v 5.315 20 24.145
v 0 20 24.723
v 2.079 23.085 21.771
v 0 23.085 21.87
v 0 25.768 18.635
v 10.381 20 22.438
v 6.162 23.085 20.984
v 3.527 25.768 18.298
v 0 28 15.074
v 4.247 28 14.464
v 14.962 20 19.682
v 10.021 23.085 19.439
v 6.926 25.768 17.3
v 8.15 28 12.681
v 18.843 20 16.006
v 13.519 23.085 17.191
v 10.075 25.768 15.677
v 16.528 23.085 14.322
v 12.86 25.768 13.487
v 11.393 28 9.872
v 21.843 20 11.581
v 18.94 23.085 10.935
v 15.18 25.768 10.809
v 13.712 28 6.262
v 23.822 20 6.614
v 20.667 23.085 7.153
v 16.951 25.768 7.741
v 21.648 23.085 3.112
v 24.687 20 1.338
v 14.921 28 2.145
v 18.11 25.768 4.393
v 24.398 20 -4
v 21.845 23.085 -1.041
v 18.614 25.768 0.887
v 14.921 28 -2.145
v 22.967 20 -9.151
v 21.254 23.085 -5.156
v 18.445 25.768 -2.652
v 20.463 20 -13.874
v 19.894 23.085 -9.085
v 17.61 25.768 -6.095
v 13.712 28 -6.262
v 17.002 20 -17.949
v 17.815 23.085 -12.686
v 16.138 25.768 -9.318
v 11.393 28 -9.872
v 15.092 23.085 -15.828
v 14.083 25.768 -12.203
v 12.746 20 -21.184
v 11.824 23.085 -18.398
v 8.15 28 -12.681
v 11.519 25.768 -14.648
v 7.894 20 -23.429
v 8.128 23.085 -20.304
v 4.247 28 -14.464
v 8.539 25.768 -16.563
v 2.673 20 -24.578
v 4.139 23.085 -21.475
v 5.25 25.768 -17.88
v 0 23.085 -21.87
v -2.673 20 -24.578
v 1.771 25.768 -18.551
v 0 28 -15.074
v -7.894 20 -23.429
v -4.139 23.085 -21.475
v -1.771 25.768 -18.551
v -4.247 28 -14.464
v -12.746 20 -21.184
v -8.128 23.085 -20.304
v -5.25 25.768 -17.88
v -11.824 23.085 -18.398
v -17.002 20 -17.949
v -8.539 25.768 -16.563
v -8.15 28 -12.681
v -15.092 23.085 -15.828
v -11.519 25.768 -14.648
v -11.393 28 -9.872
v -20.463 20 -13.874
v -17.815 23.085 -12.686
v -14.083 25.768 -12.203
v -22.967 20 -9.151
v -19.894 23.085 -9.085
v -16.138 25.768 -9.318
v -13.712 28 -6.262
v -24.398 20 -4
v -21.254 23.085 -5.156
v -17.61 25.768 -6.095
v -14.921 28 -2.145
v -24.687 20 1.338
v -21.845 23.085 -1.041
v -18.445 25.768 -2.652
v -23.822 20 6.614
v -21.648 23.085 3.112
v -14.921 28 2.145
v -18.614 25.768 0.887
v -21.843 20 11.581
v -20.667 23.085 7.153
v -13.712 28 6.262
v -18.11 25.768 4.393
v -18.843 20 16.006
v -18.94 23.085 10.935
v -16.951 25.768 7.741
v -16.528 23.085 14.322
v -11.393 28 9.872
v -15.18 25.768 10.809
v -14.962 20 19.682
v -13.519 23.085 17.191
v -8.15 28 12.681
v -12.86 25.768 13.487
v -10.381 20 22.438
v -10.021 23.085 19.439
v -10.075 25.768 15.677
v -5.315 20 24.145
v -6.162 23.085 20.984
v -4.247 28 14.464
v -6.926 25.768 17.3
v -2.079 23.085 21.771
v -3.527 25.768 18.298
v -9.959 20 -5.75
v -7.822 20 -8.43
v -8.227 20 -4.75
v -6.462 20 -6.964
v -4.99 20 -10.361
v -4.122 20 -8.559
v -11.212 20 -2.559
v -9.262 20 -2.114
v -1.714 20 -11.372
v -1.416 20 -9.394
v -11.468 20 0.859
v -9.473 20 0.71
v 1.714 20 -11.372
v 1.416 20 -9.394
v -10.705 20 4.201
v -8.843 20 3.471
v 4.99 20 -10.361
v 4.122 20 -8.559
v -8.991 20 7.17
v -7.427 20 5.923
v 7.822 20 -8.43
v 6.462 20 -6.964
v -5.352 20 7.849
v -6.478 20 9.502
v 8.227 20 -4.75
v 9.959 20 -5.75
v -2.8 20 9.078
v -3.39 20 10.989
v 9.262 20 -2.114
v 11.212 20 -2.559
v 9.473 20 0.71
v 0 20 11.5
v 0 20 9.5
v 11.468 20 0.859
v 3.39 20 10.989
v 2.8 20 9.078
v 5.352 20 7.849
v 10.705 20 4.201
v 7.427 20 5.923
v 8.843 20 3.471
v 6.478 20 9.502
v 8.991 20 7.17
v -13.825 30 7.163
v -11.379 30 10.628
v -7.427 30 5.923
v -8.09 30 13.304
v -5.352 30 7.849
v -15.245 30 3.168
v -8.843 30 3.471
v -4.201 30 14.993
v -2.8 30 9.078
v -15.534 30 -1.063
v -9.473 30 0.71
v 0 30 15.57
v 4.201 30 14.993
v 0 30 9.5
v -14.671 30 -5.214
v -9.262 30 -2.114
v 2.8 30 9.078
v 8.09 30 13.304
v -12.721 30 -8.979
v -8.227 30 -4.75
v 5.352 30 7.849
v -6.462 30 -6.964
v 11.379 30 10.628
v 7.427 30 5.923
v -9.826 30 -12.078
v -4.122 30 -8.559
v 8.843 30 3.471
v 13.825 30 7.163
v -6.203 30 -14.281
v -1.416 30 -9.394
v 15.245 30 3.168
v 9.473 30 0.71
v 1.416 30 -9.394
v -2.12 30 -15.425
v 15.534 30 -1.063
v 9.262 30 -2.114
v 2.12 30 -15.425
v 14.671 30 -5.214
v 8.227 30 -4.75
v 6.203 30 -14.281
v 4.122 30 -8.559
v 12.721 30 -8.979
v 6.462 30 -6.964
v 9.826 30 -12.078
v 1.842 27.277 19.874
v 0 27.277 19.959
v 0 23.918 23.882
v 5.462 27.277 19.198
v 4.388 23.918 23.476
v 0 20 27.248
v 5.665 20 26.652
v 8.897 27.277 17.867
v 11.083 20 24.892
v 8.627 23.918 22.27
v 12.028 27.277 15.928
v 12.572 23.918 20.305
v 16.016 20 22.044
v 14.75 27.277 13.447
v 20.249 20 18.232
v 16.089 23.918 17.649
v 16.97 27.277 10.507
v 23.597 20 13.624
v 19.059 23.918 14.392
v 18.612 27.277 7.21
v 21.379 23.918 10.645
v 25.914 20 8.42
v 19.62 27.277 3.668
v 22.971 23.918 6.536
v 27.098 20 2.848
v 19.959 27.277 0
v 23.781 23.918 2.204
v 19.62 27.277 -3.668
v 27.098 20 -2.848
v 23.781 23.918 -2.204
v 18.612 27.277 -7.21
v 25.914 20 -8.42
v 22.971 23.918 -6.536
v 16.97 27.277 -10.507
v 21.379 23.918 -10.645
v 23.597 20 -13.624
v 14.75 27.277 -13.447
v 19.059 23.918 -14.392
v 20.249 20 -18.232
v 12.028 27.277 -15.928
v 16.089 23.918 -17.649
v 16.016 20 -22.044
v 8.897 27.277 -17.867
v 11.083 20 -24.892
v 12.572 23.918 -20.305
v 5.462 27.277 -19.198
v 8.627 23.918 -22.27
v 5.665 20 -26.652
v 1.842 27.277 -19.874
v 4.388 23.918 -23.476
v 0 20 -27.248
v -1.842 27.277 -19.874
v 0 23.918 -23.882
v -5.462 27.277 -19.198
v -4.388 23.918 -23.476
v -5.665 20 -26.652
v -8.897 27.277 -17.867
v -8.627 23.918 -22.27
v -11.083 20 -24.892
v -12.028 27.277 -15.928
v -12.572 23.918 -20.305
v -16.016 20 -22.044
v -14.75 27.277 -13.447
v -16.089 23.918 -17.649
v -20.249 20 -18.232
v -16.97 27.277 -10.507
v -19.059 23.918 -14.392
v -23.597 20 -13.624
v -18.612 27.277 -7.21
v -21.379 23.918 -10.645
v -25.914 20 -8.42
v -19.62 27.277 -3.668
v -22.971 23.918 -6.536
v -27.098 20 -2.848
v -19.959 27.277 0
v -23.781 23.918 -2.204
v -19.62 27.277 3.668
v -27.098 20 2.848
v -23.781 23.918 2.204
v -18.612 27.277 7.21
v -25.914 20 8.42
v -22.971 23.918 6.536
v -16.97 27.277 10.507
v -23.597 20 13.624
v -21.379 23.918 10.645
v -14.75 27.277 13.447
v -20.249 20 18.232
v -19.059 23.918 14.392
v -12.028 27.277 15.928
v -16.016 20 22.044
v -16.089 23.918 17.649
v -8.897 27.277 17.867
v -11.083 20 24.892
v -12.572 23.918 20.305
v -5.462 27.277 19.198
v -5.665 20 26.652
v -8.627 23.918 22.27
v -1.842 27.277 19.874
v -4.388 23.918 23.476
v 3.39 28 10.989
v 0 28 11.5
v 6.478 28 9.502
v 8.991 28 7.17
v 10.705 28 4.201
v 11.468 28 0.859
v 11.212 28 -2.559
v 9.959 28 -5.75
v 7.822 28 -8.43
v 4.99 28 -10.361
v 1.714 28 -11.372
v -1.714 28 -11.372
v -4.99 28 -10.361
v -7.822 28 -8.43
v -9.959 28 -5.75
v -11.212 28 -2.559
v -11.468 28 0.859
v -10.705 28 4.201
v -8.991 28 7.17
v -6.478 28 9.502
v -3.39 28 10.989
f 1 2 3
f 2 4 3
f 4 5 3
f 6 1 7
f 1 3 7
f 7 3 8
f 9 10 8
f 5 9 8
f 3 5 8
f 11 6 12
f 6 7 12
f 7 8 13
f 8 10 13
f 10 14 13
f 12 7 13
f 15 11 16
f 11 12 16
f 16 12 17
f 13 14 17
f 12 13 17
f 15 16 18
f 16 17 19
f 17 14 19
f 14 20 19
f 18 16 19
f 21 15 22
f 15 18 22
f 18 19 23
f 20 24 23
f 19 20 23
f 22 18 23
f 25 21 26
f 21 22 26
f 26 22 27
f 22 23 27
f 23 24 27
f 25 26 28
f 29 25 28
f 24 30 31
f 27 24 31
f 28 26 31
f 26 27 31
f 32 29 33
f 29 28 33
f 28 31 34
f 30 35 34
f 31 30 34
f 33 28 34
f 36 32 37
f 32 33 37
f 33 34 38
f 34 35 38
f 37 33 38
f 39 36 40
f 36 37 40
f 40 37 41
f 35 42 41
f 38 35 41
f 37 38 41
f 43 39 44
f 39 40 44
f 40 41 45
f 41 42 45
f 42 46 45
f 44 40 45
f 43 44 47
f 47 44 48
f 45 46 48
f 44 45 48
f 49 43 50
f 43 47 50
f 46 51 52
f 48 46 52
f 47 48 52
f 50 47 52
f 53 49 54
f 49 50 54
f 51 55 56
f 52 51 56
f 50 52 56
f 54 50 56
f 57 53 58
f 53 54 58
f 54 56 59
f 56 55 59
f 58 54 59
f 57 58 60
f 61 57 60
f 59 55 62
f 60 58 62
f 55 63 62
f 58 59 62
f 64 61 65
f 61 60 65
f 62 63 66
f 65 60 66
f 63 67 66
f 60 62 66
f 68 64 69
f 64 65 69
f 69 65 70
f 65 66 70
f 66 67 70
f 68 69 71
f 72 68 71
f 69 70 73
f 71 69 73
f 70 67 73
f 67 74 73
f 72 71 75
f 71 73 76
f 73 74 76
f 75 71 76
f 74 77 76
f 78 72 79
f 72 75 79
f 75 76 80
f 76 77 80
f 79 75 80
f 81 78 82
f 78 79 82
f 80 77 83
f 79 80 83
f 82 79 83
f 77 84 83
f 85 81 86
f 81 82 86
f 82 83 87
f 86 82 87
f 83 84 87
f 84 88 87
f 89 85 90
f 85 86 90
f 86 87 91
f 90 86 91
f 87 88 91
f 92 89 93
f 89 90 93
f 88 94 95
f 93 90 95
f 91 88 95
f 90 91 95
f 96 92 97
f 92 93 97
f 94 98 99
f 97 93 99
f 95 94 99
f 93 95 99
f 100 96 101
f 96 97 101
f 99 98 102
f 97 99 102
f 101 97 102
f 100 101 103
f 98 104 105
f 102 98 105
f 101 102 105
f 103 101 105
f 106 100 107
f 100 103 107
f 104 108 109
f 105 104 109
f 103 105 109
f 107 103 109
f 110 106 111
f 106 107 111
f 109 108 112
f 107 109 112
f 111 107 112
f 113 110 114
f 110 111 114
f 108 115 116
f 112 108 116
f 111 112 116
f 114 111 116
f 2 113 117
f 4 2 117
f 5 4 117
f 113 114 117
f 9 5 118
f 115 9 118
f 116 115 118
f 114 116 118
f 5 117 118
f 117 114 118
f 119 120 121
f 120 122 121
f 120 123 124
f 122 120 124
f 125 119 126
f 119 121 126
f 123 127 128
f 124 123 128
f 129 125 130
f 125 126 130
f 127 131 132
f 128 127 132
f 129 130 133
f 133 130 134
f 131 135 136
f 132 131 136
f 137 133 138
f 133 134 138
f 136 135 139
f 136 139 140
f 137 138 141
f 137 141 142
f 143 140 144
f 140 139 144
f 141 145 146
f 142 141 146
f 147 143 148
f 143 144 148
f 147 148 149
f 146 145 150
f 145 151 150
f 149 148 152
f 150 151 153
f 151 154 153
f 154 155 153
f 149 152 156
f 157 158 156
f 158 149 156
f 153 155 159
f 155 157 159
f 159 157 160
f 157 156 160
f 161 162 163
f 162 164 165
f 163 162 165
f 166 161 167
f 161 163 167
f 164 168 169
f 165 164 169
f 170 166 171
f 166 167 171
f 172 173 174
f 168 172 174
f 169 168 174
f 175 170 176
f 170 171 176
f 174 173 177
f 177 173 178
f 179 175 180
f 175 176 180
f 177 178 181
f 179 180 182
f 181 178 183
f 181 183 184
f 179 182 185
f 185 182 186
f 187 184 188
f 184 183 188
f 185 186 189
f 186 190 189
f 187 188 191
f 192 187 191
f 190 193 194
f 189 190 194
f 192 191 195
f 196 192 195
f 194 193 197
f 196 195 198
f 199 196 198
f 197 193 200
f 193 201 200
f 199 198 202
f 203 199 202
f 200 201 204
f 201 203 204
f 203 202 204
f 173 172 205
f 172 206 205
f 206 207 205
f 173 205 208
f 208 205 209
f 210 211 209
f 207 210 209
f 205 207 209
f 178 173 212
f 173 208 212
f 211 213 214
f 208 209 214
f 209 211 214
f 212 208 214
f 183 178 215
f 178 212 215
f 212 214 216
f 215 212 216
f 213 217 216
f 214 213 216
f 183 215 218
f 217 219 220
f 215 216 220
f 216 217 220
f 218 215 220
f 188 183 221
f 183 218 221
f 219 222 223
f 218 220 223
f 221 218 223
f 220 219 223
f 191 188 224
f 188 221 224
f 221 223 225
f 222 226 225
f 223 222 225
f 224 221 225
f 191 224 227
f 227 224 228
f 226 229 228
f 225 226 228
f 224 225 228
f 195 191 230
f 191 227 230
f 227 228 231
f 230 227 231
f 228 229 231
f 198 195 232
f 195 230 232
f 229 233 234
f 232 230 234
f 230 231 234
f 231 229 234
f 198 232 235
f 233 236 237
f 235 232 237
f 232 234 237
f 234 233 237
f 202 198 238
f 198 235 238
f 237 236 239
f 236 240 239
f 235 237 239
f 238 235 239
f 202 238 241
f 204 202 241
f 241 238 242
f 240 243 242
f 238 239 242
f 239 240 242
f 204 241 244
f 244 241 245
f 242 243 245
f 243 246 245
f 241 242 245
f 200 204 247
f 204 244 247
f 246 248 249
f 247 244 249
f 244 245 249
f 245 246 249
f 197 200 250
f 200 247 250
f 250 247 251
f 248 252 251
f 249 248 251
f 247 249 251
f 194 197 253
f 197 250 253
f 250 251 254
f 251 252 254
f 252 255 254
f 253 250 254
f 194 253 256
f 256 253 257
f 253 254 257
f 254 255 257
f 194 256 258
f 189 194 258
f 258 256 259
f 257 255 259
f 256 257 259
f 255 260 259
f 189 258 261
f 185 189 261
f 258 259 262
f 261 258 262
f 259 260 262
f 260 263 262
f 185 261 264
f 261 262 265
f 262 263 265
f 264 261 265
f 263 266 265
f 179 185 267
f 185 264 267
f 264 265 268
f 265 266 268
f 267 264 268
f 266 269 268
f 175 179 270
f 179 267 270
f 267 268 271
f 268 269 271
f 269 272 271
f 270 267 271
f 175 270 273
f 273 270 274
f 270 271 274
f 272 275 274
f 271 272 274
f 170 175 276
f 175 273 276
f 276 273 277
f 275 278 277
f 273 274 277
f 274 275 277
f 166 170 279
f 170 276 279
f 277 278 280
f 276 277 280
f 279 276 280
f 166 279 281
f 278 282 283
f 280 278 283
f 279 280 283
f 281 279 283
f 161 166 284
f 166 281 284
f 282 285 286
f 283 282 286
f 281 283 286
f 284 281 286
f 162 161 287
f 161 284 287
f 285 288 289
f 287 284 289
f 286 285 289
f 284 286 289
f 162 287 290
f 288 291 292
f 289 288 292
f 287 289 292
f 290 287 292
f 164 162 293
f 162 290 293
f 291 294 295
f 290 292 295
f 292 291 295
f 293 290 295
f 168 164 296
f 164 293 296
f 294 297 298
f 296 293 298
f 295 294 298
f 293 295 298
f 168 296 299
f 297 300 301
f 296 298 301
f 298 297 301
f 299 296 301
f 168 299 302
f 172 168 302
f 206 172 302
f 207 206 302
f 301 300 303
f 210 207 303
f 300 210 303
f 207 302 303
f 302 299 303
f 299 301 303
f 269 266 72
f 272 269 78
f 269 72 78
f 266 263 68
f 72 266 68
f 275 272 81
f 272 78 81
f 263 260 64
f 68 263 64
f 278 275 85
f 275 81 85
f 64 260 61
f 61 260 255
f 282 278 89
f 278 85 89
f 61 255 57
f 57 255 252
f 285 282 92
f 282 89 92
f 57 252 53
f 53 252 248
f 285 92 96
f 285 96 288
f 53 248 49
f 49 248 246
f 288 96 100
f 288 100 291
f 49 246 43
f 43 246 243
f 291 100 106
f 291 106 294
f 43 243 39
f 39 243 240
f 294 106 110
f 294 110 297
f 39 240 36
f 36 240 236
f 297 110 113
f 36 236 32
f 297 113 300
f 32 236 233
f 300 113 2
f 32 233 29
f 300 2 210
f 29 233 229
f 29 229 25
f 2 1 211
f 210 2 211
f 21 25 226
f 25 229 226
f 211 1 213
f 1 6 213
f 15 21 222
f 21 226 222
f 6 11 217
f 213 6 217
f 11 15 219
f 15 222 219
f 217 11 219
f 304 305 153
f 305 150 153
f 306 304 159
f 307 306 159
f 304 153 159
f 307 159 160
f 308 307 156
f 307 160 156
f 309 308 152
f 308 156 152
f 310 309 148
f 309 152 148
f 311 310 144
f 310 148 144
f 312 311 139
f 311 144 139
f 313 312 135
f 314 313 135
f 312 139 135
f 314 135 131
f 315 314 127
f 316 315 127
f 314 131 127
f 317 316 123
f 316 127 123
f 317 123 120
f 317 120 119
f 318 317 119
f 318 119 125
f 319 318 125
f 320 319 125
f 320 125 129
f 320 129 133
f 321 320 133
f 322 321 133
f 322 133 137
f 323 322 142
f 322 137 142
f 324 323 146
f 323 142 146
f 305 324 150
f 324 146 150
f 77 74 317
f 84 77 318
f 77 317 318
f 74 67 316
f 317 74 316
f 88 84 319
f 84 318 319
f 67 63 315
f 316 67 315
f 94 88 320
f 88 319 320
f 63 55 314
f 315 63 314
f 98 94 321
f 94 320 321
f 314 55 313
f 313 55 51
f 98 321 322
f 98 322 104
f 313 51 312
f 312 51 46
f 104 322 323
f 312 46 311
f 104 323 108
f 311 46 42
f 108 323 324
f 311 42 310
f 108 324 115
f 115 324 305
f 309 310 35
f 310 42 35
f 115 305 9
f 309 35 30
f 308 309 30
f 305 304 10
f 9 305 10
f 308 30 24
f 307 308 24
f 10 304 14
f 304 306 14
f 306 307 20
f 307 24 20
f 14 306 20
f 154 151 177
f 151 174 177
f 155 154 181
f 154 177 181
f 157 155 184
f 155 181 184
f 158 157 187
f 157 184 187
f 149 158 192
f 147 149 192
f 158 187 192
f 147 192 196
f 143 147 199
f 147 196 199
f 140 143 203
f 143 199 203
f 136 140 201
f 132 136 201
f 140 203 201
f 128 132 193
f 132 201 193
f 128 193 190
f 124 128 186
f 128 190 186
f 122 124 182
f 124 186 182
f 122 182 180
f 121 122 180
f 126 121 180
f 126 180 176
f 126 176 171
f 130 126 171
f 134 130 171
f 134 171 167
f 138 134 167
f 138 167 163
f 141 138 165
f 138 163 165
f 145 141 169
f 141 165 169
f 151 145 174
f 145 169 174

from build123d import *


with BuildPart() as part:
    # Sketch2 → Revolve1 (revolve)
    with BuildSketch(Plane(origin=(0, 0, 0), x_dir=(0, 0, -1), z_dir=(1, 0, 0))):
        with BuildLine():
            Line((-11.5, 28), (-11.5, 20))
            Line((-11.5, 20), (-9.5, 20))
            Line((-9.5, 20), (-9.5, 30))
            Line((-9.5, 30), (-10.547037499, 30))
            ThreePointArc((-10.547037499, 30), (-12.849730042, 29.088218197), (-15.074481749, 28))
            Line((-15.074481749, 28), (-11.5, 28))
        make_face()
        with BuildLine():
            ThreePointArc((-15.570484899, 30), (-21.985230431, 25.672741243), (-27.247752201, 20))
            Line((-27.247752201, 20), (-24.723268392, 20))
            ThreePointArc((-24.723268392, 20), (-20.296926592, 24.480089275), (-15.074481749, 28))
            ThreePointArc((-15.074481749, 28), (-12.849730042, 29.088218197), (-10.547037499, 30))
            Line((-10.547037499, 30), (-15.570484899, 30))
        make_face()
    revolve(axis=Axis((0, 0, 0), (0, 1, 0)))


solid = part.part
